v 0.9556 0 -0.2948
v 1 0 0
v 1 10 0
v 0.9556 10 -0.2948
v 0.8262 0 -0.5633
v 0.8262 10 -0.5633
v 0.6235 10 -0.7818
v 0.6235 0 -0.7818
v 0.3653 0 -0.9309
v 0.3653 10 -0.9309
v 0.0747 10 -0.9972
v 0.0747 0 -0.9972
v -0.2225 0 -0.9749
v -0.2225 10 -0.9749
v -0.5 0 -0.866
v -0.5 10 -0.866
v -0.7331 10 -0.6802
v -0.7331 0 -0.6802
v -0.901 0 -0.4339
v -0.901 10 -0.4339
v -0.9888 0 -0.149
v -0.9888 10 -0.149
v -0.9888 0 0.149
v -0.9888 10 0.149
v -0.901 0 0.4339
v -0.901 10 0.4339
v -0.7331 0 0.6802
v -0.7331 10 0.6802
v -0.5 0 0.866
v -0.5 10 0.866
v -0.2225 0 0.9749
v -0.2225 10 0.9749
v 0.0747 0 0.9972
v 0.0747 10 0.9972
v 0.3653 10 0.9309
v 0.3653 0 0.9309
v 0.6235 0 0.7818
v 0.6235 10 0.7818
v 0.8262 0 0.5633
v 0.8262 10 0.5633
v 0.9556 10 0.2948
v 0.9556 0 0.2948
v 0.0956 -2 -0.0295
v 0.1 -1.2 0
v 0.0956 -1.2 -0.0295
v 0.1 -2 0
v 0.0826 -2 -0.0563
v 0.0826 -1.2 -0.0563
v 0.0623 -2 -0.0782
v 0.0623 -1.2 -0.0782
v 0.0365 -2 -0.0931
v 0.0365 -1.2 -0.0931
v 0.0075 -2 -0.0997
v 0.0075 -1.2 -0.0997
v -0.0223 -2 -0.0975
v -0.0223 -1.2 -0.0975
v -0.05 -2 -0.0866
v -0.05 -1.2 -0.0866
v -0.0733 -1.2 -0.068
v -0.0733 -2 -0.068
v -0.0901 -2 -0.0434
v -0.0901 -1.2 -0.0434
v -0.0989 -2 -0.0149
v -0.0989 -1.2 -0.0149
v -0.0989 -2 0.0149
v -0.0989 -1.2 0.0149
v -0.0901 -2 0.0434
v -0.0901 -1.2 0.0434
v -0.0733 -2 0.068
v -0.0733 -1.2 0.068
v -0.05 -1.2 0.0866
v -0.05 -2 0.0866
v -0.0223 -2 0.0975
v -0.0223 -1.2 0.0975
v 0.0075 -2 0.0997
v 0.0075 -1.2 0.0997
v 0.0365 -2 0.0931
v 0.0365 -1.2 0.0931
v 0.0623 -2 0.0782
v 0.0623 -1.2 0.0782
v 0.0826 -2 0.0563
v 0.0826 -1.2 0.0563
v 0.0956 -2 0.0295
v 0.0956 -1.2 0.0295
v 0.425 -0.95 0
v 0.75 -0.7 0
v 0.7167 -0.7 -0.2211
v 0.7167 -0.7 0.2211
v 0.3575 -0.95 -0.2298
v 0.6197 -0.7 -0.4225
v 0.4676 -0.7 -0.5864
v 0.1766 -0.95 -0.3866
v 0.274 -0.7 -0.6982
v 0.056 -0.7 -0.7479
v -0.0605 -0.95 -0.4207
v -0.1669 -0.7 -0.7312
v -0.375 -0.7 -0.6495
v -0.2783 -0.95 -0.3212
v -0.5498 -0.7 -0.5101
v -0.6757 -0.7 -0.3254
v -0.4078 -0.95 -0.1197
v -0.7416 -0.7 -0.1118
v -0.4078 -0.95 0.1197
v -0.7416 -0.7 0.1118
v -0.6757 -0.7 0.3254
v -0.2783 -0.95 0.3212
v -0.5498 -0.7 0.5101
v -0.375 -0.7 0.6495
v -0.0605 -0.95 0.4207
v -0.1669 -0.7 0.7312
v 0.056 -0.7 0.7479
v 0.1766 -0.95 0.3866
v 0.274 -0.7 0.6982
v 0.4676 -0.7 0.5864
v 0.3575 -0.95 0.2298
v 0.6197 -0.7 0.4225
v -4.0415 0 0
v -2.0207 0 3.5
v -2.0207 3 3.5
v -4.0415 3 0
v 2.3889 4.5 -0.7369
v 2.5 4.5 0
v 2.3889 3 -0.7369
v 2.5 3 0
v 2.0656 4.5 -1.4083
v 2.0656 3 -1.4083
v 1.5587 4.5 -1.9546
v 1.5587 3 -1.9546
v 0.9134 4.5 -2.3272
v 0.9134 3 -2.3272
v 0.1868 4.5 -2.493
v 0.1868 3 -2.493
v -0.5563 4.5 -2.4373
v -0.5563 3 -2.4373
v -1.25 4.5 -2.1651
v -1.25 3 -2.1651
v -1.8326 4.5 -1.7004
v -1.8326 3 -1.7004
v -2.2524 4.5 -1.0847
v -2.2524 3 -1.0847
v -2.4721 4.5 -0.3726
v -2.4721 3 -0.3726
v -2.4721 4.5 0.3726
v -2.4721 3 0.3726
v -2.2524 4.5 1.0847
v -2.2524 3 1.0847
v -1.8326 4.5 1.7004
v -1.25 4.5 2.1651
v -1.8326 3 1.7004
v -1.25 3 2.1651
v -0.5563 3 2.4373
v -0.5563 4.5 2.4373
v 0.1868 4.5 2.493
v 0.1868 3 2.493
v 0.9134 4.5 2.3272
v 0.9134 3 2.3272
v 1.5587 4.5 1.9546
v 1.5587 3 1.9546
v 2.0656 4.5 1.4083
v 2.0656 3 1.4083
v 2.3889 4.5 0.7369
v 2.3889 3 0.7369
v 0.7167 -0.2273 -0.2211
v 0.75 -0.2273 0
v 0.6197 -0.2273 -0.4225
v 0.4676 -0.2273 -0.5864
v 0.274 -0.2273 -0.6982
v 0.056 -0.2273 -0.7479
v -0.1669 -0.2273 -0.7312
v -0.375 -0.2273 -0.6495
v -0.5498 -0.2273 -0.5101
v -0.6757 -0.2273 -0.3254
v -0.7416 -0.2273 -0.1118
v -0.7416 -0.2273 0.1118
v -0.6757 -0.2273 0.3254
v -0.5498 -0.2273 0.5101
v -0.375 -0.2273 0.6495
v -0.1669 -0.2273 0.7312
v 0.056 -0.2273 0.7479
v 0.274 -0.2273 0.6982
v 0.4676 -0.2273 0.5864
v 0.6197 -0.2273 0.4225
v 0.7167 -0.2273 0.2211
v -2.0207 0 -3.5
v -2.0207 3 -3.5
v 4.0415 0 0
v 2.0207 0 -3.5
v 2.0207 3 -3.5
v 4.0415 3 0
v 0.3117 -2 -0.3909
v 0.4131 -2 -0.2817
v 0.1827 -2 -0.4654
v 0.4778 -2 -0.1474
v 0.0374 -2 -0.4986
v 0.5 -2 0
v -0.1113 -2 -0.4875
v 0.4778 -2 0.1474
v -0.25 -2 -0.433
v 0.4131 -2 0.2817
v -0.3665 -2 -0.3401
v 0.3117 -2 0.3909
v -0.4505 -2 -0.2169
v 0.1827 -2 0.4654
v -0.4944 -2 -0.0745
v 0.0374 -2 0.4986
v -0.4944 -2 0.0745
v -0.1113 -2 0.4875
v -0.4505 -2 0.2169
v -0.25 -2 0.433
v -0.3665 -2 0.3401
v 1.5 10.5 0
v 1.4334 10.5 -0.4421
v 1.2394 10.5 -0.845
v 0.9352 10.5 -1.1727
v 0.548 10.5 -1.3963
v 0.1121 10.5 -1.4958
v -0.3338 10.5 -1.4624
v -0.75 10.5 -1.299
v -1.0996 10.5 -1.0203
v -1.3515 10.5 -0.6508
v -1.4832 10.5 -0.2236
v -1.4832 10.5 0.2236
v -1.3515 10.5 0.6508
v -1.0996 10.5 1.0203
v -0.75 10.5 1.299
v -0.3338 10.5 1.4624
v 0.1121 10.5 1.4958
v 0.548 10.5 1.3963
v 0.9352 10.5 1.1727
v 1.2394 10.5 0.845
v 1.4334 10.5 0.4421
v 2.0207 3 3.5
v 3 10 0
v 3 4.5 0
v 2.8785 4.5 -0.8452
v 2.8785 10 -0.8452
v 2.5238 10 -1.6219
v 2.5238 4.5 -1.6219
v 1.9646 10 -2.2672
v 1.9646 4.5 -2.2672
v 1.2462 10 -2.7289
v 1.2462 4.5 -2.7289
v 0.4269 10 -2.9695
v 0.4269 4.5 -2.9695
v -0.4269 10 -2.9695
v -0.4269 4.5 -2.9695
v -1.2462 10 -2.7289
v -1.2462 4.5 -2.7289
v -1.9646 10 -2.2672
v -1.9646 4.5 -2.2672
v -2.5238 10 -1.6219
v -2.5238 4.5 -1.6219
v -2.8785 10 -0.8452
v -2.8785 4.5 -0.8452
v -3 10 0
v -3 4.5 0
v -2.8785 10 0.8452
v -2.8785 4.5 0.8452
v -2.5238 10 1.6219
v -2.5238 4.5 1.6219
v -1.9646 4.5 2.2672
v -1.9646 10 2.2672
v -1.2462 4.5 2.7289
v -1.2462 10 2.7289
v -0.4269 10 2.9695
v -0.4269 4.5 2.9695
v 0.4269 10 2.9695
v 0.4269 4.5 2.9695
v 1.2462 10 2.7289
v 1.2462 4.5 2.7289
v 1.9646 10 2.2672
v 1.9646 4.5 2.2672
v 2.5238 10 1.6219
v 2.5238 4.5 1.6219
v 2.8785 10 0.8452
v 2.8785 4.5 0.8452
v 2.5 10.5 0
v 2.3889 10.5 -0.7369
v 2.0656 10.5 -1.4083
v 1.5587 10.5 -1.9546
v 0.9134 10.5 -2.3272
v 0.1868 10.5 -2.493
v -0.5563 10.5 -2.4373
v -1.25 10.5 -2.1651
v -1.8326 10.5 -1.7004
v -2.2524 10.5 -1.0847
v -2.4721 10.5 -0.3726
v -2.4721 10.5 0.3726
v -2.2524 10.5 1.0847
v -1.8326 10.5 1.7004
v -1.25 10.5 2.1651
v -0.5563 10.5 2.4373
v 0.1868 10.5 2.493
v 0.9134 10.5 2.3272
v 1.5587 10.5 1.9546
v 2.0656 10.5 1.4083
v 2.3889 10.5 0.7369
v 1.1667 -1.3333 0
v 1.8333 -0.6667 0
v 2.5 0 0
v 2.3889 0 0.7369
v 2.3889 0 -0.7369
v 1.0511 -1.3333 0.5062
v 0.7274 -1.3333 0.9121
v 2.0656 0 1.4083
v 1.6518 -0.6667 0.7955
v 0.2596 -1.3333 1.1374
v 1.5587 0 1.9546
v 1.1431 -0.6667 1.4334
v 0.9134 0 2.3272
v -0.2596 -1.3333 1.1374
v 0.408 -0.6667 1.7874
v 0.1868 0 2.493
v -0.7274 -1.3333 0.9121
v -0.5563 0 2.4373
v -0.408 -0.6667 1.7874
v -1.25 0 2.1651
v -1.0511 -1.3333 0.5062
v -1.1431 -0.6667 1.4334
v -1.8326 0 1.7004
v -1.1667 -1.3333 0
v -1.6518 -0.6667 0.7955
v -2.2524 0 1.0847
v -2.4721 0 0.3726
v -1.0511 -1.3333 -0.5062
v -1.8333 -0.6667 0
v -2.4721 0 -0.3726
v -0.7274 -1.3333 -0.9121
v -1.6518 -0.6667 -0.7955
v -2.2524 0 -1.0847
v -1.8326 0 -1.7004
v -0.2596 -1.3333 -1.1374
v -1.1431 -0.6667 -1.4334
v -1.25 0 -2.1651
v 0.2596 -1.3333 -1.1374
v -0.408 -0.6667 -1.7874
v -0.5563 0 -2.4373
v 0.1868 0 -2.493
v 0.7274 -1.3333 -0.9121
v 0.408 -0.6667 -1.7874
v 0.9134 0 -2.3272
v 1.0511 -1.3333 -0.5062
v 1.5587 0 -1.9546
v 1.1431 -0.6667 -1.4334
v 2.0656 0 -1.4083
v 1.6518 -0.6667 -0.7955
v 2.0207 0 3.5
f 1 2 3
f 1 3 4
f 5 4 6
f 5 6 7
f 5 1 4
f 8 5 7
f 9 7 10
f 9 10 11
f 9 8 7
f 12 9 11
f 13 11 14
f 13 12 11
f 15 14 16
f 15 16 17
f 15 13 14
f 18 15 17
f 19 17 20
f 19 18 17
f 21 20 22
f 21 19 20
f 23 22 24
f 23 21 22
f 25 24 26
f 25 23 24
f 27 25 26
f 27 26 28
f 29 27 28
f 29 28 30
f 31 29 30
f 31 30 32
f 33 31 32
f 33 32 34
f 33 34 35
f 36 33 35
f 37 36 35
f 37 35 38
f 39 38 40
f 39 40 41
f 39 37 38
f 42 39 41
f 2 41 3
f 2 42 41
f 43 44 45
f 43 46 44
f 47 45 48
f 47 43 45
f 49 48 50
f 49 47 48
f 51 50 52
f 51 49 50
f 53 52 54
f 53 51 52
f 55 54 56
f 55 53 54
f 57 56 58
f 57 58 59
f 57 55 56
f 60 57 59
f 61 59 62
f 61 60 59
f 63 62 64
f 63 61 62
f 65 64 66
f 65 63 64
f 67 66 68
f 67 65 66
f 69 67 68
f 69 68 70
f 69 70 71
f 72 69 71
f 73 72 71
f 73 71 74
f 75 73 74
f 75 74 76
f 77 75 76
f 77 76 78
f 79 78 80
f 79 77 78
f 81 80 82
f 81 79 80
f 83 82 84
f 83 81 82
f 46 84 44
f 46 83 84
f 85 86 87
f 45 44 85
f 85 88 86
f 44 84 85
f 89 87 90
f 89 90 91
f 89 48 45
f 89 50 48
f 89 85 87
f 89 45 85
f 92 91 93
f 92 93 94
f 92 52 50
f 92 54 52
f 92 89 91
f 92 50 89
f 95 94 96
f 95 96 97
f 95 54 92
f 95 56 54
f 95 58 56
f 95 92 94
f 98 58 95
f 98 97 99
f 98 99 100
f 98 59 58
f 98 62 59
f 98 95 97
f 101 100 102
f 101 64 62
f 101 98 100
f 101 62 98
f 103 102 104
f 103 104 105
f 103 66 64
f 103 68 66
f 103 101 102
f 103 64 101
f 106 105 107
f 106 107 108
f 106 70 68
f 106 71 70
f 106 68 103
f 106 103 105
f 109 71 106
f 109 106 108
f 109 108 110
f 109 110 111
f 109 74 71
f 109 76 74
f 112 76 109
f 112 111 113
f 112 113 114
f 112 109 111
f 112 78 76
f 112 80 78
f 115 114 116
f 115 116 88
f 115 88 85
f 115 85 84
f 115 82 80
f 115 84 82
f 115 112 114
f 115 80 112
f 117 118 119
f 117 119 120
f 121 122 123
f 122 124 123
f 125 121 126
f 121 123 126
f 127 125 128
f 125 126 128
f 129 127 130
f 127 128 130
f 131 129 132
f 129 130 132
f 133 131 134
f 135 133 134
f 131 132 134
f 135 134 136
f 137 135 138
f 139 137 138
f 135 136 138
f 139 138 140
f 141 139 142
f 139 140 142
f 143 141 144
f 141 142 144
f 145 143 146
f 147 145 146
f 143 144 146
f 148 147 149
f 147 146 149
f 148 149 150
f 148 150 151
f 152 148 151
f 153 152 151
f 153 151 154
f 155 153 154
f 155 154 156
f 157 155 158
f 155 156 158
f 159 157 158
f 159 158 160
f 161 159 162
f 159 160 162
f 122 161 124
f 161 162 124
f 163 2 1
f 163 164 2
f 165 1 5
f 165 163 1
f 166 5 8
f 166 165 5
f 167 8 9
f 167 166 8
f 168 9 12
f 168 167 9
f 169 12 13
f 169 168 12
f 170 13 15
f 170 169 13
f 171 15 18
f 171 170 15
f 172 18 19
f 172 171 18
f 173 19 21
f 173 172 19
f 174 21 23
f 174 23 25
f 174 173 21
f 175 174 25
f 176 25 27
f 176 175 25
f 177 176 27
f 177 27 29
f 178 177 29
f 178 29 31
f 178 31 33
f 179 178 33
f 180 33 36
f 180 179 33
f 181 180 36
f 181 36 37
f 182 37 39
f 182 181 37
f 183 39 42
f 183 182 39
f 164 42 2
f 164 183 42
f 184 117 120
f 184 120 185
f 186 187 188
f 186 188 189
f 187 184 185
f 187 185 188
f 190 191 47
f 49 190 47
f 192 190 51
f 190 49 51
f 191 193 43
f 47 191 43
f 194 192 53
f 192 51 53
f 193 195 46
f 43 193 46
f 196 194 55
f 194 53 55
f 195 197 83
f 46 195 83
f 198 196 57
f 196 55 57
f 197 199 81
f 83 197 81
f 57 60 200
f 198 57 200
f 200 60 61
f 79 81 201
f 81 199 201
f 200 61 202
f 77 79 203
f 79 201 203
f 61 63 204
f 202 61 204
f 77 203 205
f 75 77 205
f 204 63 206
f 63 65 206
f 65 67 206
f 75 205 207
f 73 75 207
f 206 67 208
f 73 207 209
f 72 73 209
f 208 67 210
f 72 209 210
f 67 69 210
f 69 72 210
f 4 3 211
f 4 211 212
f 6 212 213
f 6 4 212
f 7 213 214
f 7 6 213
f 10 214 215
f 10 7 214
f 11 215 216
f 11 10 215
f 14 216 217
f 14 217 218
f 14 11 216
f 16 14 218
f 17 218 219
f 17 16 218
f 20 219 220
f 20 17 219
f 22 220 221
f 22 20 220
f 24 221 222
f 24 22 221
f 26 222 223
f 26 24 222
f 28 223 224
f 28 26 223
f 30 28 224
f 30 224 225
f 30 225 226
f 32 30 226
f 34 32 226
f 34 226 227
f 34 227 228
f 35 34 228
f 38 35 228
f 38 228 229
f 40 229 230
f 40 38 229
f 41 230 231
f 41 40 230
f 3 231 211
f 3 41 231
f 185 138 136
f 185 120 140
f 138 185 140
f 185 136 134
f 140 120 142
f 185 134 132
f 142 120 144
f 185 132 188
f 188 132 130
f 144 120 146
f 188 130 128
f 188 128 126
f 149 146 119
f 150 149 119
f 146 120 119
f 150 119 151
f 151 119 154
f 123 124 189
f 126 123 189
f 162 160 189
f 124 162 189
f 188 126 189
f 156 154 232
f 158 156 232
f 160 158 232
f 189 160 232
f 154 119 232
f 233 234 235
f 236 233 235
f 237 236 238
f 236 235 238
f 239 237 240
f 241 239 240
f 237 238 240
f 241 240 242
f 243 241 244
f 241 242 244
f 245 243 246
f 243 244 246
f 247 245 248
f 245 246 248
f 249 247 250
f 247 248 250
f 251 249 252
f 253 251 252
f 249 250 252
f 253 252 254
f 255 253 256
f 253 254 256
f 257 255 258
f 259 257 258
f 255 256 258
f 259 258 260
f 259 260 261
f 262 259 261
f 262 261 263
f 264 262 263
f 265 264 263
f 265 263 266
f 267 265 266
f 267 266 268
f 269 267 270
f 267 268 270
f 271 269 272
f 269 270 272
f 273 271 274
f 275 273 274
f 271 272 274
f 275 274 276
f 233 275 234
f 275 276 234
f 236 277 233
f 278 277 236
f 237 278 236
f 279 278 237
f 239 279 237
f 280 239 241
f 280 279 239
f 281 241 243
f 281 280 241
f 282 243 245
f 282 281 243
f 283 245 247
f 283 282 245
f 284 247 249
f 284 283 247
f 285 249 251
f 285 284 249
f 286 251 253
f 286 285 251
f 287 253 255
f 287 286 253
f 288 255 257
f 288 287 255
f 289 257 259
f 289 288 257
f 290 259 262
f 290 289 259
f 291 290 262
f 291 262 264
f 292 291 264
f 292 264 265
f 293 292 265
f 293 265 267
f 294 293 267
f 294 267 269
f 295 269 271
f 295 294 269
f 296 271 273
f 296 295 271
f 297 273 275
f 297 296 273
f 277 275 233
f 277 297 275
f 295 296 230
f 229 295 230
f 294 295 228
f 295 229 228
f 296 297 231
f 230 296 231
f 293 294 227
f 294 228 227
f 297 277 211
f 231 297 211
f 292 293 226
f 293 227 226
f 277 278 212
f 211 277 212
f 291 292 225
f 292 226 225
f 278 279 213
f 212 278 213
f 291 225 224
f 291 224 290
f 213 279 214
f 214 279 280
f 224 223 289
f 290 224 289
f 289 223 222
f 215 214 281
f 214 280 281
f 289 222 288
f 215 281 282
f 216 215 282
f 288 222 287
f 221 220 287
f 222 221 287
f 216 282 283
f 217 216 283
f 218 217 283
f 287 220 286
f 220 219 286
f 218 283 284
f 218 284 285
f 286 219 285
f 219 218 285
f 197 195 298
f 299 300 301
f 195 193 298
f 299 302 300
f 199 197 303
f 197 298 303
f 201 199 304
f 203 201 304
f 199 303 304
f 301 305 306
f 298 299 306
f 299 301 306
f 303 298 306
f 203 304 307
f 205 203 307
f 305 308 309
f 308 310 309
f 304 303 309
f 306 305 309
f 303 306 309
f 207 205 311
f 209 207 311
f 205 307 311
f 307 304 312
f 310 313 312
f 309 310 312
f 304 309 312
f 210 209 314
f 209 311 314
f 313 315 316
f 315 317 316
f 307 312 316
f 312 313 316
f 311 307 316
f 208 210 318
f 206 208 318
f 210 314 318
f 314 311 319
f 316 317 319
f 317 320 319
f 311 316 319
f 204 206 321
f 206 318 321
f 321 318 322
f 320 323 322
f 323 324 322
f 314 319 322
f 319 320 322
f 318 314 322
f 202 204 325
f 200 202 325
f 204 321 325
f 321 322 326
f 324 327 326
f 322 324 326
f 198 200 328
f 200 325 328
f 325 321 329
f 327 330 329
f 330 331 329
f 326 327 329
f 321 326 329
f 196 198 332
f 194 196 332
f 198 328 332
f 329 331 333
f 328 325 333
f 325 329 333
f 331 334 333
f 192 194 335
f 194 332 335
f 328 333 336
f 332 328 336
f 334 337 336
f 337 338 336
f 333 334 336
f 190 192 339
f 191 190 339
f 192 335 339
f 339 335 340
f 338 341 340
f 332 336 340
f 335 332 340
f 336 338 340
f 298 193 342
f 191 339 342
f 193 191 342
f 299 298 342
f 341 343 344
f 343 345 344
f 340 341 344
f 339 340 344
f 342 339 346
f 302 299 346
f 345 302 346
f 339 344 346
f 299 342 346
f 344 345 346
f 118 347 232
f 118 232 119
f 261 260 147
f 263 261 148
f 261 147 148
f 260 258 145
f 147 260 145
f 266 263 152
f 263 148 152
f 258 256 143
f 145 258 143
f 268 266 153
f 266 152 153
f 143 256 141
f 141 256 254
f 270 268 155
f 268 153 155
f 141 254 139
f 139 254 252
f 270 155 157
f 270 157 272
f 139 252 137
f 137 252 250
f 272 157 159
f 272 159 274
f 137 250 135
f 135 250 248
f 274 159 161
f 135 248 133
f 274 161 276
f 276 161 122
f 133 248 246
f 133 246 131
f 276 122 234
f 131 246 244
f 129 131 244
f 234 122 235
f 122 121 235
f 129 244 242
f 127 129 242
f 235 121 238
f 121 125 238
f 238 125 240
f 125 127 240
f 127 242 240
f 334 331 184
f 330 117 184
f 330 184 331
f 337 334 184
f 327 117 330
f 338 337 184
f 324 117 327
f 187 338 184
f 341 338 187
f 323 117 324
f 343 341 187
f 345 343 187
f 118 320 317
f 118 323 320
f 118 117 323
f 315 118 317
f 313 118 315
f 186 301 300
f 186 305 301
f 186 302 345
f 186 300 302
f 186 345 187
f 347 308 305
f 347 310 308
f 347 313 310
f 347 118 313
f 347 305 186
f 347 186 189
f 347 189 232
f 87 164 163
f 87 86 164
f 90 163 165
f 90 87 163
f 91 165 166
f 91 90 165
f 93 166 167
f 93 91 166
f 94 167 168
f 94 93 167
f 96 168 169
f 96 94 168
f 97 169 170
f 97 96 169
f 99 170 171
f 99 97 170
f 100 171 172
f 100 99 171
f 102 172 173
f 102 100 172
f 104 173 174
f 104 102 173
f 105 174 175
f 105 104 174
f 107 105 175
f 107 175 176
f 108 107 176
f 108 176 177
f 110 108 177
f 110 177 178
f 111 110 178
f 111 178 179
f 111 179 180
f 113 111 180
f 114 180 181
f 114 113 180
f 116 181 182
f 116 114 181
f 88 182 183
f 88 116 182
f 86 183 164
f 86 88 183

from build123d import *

# Parameters (mm, degrees)
BOSS_EXTRUDE1_DEPTH = 3
CHAMFER1_SIZE       = 0.5


with BuildPart() as part:
    # Sketch1 → Boss-Extrude1 (new body)
    with BuildSketch(Plane.XZ):
        Polygon((-2.020725942, 3.5), (-4.041451884, 0), (-2.020725942, -3.5), (2.020725942, -3.5), (4.041451884, 0), (2.020725942, 3.5), align=None)
    extrude(amount=-BOSS_EXTRUDE1_DEPTH)

    # Sketch2 → Revolve1 (revolve)
    with BuildSketch(Plane(origin=(0, 0, 0), x_dir=(-1, 0, 0), z_dir=(0, 0, -1))):
        Polygon((-2.5, 3), (0, 3), (0, 10.5), (-3, 10.5), (-3, 4.5), (-2.5, 4.5), align=None)
    revolve(axis=Axis((0, 3, 0), (0, 1, 0)))

    # Sketch3 → Revolve2 (revolve)
    with BuildSketch(Plane.XY):
        Polygon((2.5, 0), (0, 0), (0, -2), (0.5, -2), align=None)
    revolve(axis=Axis((0, 0, 0), (0, -1, 0)))

    # Sketch4 → Cut-Revolve1 (revolve, cut)
    with BuildSketch(Plane(origin=(0, 0, 0), x_dir=(-1, 0, 0), z_dir=(0, 0, -1))):
        Polygon((-0.1, -2), (0, -2), (0, 10.5), (-1, 10.5), (-1, 0), (-0.75, -0.227272727), (-0.75, -0.7), (-0.1, -1.2), align=None)
    revolve(axis=Axis((0, -2, 0), (0, 1, 0)), mode=Mode.SUBTRACT)

    # Chamfer1
    chamfer1_edges = [part.edges().sort_by_distance(p)[0] for p in [
        (-3, 10.5, 0),
        (-1, 10.5, 0),
    ]]
    chamfer(chamfer1_edges, length=CHAMFER1_SIZE)


solid = part.part
